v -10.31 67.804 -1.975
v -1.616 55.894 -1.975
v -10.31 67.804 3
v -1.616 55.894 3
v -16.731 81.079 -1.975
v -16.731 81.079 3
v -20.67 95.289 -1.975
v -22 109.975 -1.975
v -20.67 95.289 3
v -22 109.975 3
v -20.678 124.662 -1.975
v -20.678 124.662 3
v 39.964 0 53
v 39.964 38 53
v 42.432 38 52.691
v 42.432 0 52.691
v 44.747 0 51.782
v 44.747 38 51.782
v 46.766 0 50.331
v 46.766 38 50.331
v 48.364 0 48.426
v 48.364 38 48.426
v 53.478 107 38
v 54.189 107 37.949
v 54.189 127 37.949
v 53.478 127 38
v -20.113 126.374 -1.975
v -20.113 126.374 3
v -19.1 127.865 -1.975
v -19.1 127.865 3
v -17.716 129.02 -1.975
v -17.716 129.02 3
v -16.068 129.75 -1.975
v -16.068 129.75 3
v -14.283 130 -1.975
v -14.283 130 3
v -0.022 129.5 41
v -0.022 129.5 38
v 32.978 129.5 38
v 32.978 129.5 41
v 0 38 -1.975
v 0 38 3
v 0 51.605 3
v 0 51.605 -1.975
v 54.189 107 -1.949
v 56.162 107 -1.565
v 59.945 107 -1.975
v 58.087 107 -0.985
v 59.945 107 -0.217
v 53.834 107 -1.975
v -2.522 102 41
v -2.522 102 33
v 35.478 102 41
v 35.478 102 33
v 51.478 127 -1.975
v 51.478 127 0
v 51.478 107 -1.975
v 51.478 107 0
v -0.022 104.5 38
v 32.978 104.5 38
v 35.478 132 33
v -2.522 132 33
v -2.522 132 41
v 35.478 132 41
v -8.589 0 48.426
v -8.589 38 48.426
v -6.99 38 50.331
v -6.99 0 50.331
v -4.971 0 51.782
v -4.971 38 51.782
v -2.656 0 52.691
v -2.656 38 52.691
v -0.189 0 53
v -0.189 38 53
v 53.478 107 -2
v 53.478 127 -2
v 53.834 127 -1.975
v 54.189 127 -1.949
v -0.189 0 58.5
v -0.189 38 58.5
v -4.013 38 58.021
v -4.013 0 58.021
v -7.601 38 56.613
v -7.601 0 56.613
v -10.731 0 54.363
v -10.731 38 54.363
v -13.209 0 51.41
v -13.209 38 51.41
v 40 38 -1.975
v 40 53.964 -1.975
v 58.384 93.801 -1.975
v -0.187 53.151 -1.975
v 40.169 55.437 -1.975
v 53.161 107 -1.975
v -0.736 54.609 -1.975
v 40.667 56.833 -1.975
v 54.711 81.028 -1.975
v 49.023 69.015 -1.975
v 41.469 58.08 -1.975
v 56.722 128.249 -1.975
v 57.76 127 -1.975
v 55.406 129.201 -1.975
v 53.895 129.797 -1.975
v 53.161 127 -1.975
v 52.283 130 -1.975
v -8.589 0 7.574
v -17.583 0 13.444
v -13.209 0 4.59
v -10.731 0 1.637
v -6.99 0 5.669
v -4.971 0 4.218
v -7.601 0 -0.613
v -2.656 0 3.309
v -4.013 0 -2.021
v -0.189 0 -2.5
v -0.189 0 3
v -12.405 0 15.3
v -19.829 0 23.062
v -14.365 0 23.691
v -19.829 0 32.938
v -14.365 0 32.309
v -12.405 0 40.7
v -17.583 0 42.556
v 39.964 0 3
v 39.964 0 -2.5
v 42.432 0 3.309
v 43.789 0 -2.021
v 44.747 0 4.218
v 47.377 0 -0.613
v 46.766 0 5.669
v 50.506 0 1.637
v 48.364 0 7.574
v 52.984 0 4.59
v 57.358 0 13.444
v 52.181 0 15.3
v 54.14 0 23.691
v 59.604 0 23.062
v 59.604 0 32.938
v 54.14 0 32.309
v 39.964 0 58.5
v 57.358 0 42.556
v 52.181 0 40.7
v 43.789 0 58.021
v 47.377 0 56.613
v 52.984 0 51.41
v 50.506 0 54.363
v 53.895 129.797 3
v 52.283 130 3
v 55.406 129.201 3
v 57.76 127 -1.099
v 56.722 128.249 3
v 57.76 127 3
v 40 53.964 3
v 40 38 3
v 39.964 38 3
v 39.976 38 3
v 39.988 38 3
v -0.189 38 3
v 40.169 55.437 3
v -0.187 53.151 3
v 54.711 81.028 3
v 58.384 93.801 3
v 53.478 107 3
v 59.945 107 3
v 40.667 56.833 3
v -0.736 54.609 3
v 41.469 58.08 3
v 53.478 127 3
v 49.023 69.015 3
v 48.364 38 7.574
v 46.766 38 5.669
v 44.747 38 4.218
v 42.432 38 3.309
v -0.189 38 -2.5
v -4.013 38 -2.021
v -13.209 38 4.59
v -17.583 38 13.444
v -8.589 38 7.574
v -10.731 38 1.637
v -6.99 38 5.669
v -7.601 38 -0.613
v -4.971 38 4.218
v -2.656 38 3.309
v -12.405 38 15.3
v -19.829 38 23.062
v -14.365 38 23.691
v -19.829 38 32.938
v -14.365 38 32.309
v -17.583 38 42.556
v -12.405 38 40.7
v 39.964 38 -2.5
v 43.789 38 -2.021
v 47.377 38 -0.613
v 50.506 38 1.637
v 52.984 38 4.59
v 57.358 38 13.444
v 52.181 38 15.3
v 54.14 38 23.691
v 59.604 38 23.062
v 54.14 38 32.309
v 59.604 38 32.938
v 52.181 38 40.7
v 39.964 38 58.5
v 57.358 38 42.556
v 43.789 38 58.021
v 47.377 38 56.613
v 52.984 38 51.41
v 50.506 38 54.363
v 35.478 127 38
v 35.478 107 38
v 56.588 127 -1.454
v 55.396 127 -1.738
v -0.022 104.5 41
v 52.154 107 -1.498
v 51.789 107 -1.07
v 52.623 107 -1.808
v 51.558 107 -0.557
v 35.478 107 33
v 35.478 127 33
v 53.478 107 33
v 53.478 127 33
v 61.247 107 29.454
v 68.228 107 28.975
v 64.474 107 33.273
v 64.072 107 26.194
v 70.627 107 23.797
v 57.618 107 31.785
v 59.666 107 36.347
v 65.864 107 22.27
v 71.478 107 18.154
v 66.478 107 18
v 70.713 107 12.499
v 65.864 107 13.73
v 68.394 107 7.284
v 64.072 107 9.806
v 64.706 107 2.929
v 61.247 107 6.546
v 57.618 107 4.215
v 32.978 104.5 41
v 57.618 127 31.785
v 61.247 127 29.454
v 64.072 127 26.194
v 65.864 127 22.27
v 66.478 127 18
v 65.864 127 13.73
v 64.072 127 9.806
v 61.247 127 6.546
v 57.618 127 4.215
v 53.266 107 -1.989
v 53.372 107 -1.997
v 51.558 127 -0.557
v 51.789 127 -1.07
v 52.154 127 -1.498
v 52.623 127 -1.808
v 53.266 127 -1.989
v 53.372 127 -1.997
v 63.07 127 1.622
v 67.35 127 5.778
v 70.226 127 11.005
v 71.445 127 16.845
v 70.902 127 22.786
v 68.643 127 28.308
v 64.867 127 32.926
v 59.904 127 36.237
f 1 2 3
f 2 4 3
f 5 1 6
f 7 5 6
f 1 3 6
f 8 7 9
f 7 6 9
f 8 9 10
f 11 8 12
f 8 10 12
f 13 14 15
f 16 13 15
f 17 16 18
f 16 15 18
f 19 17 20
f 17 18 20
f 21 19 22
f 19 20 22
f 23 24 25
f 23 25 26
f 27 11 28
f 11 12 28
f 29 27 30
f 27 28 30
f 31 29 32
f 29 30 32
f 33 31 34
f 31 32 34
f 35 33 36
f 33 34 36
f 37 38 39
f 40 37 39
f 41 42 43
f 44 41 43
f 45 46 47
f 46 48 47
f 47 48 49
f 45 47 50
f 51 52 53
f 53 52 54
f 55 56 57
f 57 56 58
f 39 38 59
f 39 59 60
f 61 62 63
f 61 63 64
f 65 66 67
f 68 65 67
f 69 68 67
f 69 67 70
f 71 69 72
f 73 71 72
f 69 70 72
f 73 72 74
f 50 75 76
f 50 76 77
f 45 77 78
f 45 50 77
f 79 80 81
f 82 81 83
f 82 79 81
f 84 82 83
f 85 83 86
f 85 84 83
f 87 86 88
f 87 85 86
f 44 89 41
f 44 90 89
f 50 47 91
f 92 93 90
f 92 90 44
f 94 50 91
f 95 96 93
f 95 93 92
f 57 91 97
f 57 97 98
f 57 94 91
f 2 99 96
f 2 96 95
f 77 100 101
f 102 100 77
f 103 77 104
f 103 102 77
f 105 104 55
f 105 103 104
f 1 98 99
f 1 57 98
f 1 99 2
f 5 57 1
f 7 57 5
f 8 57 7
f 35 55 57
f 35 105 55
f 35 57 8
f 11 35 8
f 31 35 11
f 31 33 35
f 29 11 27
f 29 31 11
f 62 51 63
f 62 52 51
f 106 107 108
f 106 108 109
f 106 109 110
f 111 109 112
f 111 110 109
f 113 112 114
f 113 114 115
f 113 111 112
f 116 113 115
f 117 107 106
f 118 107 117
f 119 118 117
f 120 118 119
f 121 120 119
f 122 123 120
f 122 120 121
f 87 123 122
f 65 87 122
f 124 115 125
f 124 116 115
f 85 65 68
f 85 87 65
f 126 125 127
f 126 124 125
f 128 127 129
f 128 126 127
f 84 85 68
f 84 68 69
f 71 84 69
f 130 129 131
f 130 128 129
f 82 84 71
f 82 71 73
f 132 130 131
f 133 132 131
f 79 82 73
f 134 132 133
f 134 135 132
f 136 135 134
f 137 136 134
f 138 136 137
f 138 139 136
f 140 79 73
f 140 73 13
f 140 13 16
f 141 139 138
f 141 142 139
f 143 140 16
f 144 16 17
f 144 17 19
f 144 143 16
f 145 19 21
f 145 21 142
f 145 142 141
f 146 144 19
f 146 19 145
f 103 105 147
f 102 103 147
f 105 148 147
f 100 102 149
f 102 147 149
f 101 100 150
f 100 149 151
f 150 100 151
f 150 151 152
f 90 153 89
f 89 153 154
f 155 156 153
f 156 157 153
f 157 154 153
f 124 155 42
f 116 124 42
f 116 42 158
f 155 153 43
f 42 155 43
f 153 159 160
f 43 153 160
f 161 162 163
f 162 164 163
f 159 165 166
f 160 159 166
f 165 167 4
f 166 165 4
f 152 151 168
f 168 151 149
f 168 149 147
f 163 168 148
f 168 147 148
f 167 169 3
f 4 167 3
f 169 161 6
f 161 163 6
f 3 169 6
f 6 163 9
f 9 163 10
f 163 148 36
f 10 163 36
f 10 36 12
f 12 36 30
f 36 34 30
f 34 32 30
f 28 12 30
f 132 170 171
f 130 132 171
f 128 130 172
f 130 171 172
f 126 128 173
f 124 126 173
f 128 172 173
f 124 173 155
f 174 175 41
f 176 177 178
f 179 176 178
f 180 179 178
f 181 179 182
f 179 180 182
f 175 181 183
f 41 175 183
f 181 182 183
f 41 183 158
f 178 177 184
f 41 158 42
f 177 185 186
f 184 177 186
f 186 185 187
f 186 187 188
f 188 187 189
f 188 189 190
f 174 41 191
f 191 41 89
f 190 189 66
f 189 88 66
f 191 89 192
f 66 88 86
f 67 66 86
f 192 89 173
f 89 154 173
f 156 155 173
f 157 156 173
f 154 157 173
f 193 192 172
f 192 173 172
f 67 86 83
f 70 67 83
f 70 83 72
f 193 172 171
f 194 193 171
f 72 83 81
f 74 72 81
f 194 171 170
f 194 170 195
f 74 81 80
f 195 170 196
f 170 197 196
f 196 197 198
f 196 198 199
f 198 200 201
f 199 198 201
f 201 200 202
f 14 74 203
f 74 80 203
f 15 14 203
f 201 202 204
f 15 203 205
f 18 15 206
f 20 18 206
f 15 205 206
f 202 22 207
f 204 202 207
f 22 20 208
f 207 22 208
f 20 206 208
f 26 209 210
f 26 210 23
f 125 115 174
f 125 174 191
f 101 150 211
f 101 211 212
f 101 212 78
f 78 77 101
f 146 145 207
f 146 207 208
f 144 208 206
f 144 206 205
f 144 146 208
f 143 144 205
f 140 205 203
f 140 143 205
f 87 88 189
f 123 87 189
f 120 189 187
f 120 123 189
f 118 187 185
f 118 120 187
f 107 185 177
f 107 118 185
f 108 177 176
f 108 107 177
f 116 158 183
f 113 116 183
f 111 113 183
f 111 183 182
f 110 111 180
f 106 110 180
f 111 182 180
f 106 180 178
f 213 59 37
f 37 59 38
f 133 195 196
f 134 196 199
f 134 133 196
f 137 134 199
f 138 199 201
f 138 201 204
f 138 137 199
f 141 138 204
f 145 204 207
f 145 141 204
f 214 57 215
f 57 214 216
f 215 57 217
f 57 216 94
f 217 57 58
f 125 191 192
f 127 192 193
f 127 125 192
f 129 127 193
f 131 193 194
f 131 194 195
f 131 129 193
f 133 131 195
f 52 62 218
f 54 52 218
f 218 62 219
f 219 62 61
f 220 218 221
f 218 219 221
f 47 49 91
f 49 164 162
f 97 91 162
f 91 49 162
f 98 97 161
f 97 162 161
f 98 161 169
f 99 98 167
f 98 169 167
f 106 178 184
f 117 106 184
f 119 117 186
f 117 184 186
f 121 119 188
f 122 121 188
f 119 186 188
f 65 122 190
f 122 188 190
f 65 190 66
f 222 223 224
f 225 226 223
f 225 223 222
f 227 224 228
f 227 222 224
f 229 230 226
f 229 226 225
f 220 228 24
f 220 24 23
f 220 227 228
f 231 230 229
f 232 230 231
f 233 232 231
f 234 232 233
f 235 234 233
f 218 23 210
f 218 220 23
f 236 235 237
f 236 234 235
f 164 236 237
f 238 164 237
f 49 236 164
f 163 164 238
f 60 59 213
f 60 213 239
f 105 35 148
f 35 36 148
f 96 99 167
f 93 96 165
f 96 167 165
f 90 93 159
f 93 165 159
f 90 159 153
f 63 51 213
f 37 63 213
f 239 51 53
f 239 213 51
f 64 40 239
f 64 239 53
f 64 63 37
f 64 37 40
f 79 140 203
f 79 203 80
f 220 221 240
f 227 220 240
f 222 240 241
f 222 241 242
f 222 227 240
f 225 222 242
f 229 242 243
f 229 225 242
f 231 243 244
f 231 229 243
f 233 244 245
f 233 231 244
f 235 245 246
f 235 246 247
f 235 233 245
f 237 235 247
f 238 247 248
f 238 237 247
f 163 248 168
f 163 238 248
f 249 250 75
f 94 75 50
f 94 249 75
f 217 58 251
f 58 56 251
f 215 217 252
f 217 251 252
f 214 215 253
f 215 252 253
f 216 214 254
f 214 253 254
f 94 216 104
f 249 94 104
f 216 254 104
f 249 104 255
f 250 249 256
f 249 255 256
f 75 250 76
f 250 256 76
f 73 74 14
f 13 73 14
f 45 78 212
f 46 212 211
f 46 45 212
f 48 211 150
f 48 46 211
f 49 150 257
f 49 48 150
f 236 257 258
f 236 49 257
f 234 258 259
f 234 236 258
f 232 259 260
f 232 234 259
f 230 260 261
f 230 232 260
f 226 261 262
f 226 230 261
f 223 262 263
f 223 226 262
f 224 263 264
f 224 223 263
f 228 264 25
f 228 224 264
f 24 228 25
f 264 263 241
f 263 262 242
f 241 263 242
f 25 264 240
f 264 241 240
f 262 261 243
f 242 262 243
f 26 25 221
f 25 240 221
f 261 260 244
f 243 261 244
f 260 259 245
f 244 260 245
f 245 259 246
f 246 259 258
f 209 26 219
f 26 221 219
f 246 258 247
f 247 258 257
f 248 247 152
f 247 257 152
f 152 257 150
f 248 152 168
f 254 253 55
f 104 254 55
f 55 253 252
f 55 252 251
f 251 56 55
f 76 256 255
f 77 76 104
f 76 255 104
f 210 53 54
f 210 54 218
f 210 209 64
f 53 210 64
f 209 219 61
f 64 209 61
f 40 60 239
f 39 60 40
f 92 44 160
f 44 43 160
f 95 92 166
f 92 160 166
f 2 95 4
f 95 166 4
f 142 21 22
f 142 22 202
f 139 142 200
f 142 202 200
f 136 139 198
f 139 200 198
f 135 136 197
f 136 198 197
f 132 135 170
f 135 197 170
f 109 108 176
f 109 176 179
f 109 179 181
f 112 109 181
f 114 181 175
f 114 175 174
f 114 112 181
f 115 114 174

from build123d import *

# Parameters (mm, degrees)
CROQUIS1_W               = 2.2
CROQUIS1_H               = 25.999999999999993
CROQUIS1_W_2             = 2.200000000000003
CROQUIS1_H_2             = 26
SALIENTE_EXTRUIR2_DEPTH  = 3
SALIENTE_EXTRUIR3_DEPTH  = 20
CROQUIS3_R               = 7.999999999999991
CROQUIS3_R_2             = 8.000000000000002
CORTAR_EXTRUIR1_DEPTH    = 20
SALIENTE_EXTRUIR5_DEPTH  = 53.964297
CORTAR_EXTRUIR2_START    = -60
CROQUIS6_W               = 40.15324264759986
CROQUIS6_H               = 15.964297095512393
CORTAR_EXTRUIR2_DEPTH    = 60
CROQUIS7_W               = 5
CROQUIS7_H               = 20
SALIENTE_EXTRUIR7_DEPTH  = 33
SALIENTE_EXTRUIR8_START  = -5
CROQUIS9_W               = 30
CROQUIS9_H               = 30
SALIENTE_EXTRUIR8_DEPTH  = 5
SALIENTE_EXTRUIR9_START  = -20
SALIENTE_EXTRUIR9_DEPTH  = 20
SALIENTE_EXTRUIR10_START = -3
CROQUIS11_W              = 73.35697538547257
CROQUIS11_H              = 26
CROQUIS11_W_2            = 36
CROQUIS11_H_2            = 25.999999999999993
SALIENTE_EXTRUIR10_DEPTH = 3
CROQUIS12_R              = 15
CROQUIS12_R_2            = 12.499999999999995
SALIENTE_EXTRUIR13_DEPTH = 10
REDONDEO1_R              = 2
CORTAR_EXTRUIR4_DEPTH    = 134.84384260338862
SALIENTE_EXTRUIR15_DEPTH = 38
CROQUIS17_W              = 46
CROQUIS17_H              = 3
CORTAR_EXTRUIR5_DEPTH    = 20
CROQUIS18_W              = 58.34795028380313
CROQUIS18_H              = 55.73720719090147
CORTAR_EXTRUIR6_DEPTH    = 10
SALIENTE_EXTRUIR16_START = -5
SALIENTE_EXTRUIR16_DEPTH = 5
CROQUIS21_W              = 38.00000000000001
CROQUIS21_H              = 29.99999999999997
CROQUIS21_W_2            = 33.00000000000001
CROQUIS21_H_2            = 24.999999999999957
SALIENTE_EXTRUIR17_DEPTH = 3
SALIENTE_EXTRUIR18_DEPTH = 38
SALIENTE_EXTRUIR19_DEPTH = 1.974619


with BuildPart() as part:
    # Croquis1 → Saliente-Extruir2 (new body)
    with BuildSketch(Plane.XY):
        with BuildLine():
            ThreePointArc((1.78e-15, 6.500000000000045), (1.9038059222874422, 1.9038059222874395), (6.500000000000047, 0))
            Line((6.500000000000047, 0), (33.49999999999996, 0))
            ThreePointArc((33.49999999999996, 8.9e-16), (38.09619407771257, 1.9038059222874377), (40.00000000000001, 6.500000000000045))
            Line((40.00000000000001, 6.500000000000045), (39.99999999999999, 53.9642970955124))
            ThreePointArc((39.99999999999999, 53.9642970955124), (40.37823647136178, 56.149248193234044), (41.468926553672304, 58.07991369301713))
            ThreePointArc((41.468926553672304, 58.079913693017126), (57.39093897053555, 89.4797950941834), (58.67848769273629, 124.66225165562912))
            ThreePointArc((58.678487692736276, 124.66225165562913), (56.44829659298618, 128.49022222759615), (52.28324171709256, 130))
            Line((52.28324171709256, 130), (40.00000000000001, 130))
            Line((40.00000000000001, 130), (0, 130))
            Line((0, 130), (-14.283241717092526, 130))
            ThreePointArc((-14.283241717092526, 130), (-18.44829659298616, 128.49022222759615), (-20.678487692736265, 124.66225165562913))
            ThreePointArc((-20.67848769273626, 124.66225165562913), (-19.02022266397784, 88.0955618621395), (-1.615819209039536, 55.89370809971405))
            ThreePointArc((-1.6158192090395262, 55.89370809971404), (-0.41735357178952714, 53.89639076148384), (1.332e-14, 51.6047947173743))
            Line((1.324e-14, 51.6047947173743), (1.67e-15, 6.500000000000047))
        make_face()
        with Locations((3.1, 21.999999999999996)):
            Rectangle(CROQUIS1_W, CROQUIS1_H, mode=Mode.SUBTRACT)
        with Locations((36.9, 21.999999999999996)):
            Rectangle(CROQUIS1_W_2, CROQUIS1_H, mode=Mode.SUBTRACT)
        Polygon((-17.67848769273627, 127), (-15.478487692736273, 127), (-15.47848769273627, 101), (-17.678487692736265, 101), align=None, mode=Mode.SUBTRACT)
        with Locations((54.5784876927363, 114.00000000000001)):
            Rectangle(CROQUIS1_W_2, CROQUIS1_H_2, mode=Mode.SUBTRACT)
    extrude(amount=SALIENTE_EXTRUIR2_DEPTH)

    # Croquis2 → Saliente-Extruir3 (add)
    with BuildSketch(Plane(origin=(0, 0, 0), x_dir=(-1, 0, 0), z_dir=(0, 0, -1))):
        Polygon((4.481512307263694, 116.39887057980759), (4.481512307263693, 113.39887057980759), (-41.51848769273631, 113.39887057980758), (-41.51848769273631, 116.39887057980758), align=None)
    extrude(amount=SALIENTE_EXTRUIR3_DEPTH)

    # Croquis3 → Cortar-Extruir1 (cut)
    with BuildSketch(Plane(origin=(3.512e-14, 116.39887057980759, 0), x_dir=(1, -3e-16, 0), z_dir=(3e-16, 1, 0))):
        with Locations(Location((31.51848769273627, 9.999999999999998, 0), (0, 0, 180))):
            Circle(CROQUIS3_R)
        with Locations(Location((5.5184876927362705, 9.999999999999993, 0), (0, 0, 180))):
            Circle(CROQUIS3_R_2)
        Polygon((24.01848769273627, 20.000000000000004), (18.518487692736272, 20.000000000000004), (18.518487692736272, 15.000000000000005), (24.018487692736272, 15.000000000000004), align=None)
        Polygon((18.518487692736272, 15.000000000000005), (18.518487692736272, 20), (13.018487692736274, 20.000000000000004), (13.018487692736274, 15.000000000000005), align=None)
    extrude(amount=-CORTAR_EXTRUIR1_DEPTH, mode=Mode.SUBTRACT)

    # Croquis5 → Saliente-Extruir5 (add)
    with BuildSketch(Plane.XZ):
        with BuildLine():
            Line((39.96433456524687, 63.000000000000014), (-0.18890808235298706, 63.000000000000014))
            ThreePointArc((-0.18890808235298706, 63.000000000000014), (-7.362306106958867, 61.1735477674232), (-12.788788286604273, 56.138981437410735))
            ThreePointArc((-12.788788286604273, 56.138981437410735), (-19.612286758553036, 32.99999999999998), (-12.788788286604271, 9.861018562589255))
            ThreePointArc((-12.788788286604271, 9.861018562589255), (-7.362306106958855, 4.826452232576806), (-0.18890808235298392, 2.9999999999999956))
            Line((-0.18890808235298392, 2.9999999999999956), (39.96433456524688, 3))
            ThreePointArc((39.96433456524688, 3), (47.137732589852746, 4.826452232576804), (52.56421476949815, 9.861018562589242))
            ThreePointArc((52.56421476949815, 9.861018562589242), (59.38771324144694, 33.00000000000001), (52.56421476949814, 56.13898143741078))
            ThreePointArc((52.56421476949814, 56.13898143741078), (47.13773258985273, 61.17354776742321), (39.96433456524687, 63.000000000000014))
        make_face()
        with BuildLine():
            Line((39.96433456524688, 8), (-0.18890808235298012, 7.999999999999995))
            ThreePointArc((-0.18890808235298012, 7.999999999999995), (-4.971173432090228, 9.217634821717866), (-8.5888282185205, 12.5740123750595))
            ThreePointArc((-8.5888282185205, 12.5740123750595), (-14.612286758553036, 32.99999999999998), (-8.588828218520513, 53.4259876249405))
            ThreePointArc((-8.588828218520513, 53.4259876249405), (-4.971173432090235, 56.78236517828213), (-0.18890808235298706, 58))
            Line((-0.18890808235298706, 58), (39.96433456524687, 58.00000000000001))
            ThreePointArc((39.96433456524687, 58.00000000000001), (44.74659991498412, 56.78236517828215), (48.364254701414396, 53.425987624940525))
            ThreePointArc((48.364254701414396, 53.425987624940525), (54.387713241446946, 33.00000000000001), (48.364254701414396, 12.5740123750595))
            ThreePointArc((48.364254701414396, 12.5740123750595), (44.746599914984124, 9.21763482171787), (39.96433456524688, 8))
        make_face(mode=Mode.SUBTRACT)
    extrude(amount=-SALIENTE_EXTRUIR5_DEPTH)

    # Croquis6 → Cortar-Extruir2 (cut)
    with BuildSketch(Plane.XY.offset(63.000000000000014).offset(CORTAR_EXTRUIR2_START)):
        Polygon((-65.140227080974, 38), (-0.18890808235298706, 38), (-0.18890808235298706, 53.9642970955124), (39.96433456524687, 53.9642970955124), (39.96433456524687, 38), (86.01153637442849, 38), (86.01153637442849, 58.052685675367144), (-65.140227080974, 58.052685675367144), align=None)
        with Locations((19.887713241446942, 45.982148547756196)):
            Rectangle(CROQUIS6_W, CROQUIS6_H)
    extrude(amount=CORTAR_EXTRUIR2_DEPTH, mode=Mode.SUBTRACT)



with BuildPart() as body_2:
    # Croquis7 → Saliente-Extruir7 (new body)
    with BuildSketch(Plane(origin=(53.4784876927363, 0, 0), x_dir=(0, 0, -1), z_dir=(1, 0, 0))):
        with Locations((-35.5, 117.00000000000001)):
            Rectangle(CROQUIS7_W, CROQUIS7_H)
    extrude(amount=-SALIENTE_EXTRUIR7_DEPTH)

    # Croquis9 → Saliente-Extruir8 (add)
    with BuildSketch(Plane.XY.offset(38).offset(SALIENTE_EXTRUIR8_START)):
        with Locations((20.478487692736316, 117.00000000000003)):
            Rectangle(CROQUIS9_W, CROQUIS9_H)
    extrude(amount=SALIENTE_EXTRUIR8_DEPTH)


with BuildPart() as part_1:
    add(part.part)

    add(body_2.part)  # Saliente-Extruir9 merges body 2
    # Croquis10 → Saliente-Extruir9 (add)
    with BuildSketch(Plane(origin=(0, 127, 0), x_dir=(1, 0, 0), z_dir=(0, 1, 0)).offset(SALIENTE_EXTRUIR9_START)):
        with BuildLine():
            Line((54.189147591213455, -37.94923857868021), (53.4784876927363, -38))
            Line((53.4784876927363, -38), (53.4784876927363, -33))
            ThreePointArc((53.4784876927363, -33), (66.4784876927363, -18.000000000000004), (53.4784876927363, -2.9999999999999996))
            Line((53.4784876927363, -2.9999999999999996), (53.4784876927363, 0))
            Line((53.4784876927363, 0), (51.4784876927363, -4.3e-16))
            Line((51.4784876927363, -4.3e-16), (51.4784876927363, 1.9999999999999996))
            Line((51.4784876927363, 1.9999999999999996), (53.4784876927363, 2))
            Line((53.4784876927363, 2), (54.18914759121346, 1.9492385786802033))
            ThreePointArc((54.18914759121346, 1.9492385786802033), (71.47848769273631, -18.000000000000007), (54.189147591213455, -37.94923857868021))
        make_face()
    extrude(amount=SALIENTE_EXTRUIR9_DEPTH)

    # Croquis11 → Saliente-Extruir10 (add)
    with BuildSketch(Plane(origin=(0, 0, 0), x_dir=(-1, 0, 0), z_dir=(0, 0, -1)).offset(SALIENTE_EXTRUIR10_START)):
        with Locations((-19.000000000000018, 114.00000000000001)):
            Rectangle(CROQUIS11_W, CROQUIS11_H)
        with Locations((-20, 21.999999999999996)):
            Rectangle(CROQUIS11_W_2, CROQUIS11_H_2)
    extrude(amount=SALIENTE_EXTRUIR10_DEPTH)

    # Croquis12 → Saliente-Extruir13 (add)
    with BuildSketch(Plane.XY.offset(38)):
        with Locations(Location((20.478487692736316, 117.00000000000003, 0), (0, 0, 180))):
            Circle(CROQUIS12_R)
        with Locations((20.478487692736316, 117.00000000000003)):
            Circle(CROQUIS12_R_2, mode=Mode.SUBTRACT)
    extrude(amount=SALIENTE_EXTRUIR13_DEPTH)

    # Redondeo1
    redondeo1_edges = [part_1.edges().sort_by_distance(p)[0] for p in [
        (51.4784876927363, 117, -1.9999999999999996),
    ]]
    fillet(redondeo1_edges, radius=REDONDEO1_R - 0.0001)  # a hair under: the kernel refuses the full size

    # Croquis14 → Cortar-Extruir4 (cut, through all)
    with BuildSketch(Plane(origin=(0, 38, 0), x_dir=(1, 0, 0), z_dir=(0, 1, 0))):
        with BuildLine():
            ThreePointArc((48.36425493229366, -7.57401013919257), (44.74660042130513, -4.217634185252958), (39.96433624040055, -2.9999999999999822))
            Line((39.96433624040055, -2.999999999999983), (7.11e-15, -2.999999999999993))
            Line((7.11e-15, -2.999999999999993), (-0.18890808235298095, -2.999999999999993))
            ThreePointArc((-0.1889080823529836, -2.999999999999993), (-4.9711734320902385, -4.217634821717869), (-8.58882821852051, -7.5740123750595165))
            ThreePointArc((-8.588828218520508, -7.574012375059517), (-14.612286758553015, -27.99999999999999), (-8.588828218520522, -48.42598762494047))
            ThreePointArc((-8.588828218520526, -48.425987624940475), (-4.971173432090255, -51.78236517828213), (-0.18890808235300008, -53.00000000000001))
            Line((-0.18890808235300227, -53.00000000000001), (39.964336240400556, -53.00000000000002))
            ThreePointArc((39.964336240400556, -53.00000000000002), (44.74660042130514, -51.78236581474704), (48.36425493229367, -48.42598986080743))
            ThreePointArc((48.36425493229366, -48.42598986080742), (54.38771708653283, -27.999999999999993), (48.36425493229366, -7.574010139192573))
        make_face()
        with BuildLine():
            ThreePointArc((52.56421476949813, -56.13898143741079), (59.326001019675516, -35.29338058691803), (54.84218308379573, -13.842128762629663))
            ThreePointArc((54.84218308379583, -13.842128762629622), (57.147087828663246, -32.41618815306372), (50.88423053986159, -50.05378681904967))
            ThreePointArc((50.88423053986159, -50.05378681904967), (46.181279675576505, -54.41707555917115), (39.964336240400556, -56.00000000000002))
            Line((39.964336240400556, -56.00000000000002), (-0.18890808235300227, -56.00000000000002))
            ThreePointArc((-0.18890808235300094, -56.00000000000002), (-6.40585303701144, -54.417074731766775), (-11.108804259370787, -50.05378391242262))
            ThreePointArc((-11.108804259370793, -50.05378391242262), (-17.37165915295804, -32.41617365692677), (-15.066744784377477, -13.84210526315766))
            ThreePointArc((-15.066744784377445, -13.84210526315767), (-19.550575244054688, -35.29336745437739), (-12.788788286604277, -56.138981437410735))
            ThreePointArc((-12.788788286604277, -56.138981437410735), (-7.362306106958864, -61.17354776742319), (-0.18890808235299072, -63))
            Line((-0.18890808235298845, -63), (39.96433456524687, -63.000000000000014))
            ThreePointArc((39.96433456524687, -63.000000000000014), (47.137732589852725, -61.173547767423216), (52.56421476949813, -56.13898143741079))
        make_face()
    extrude(amount=-CORTAR_EXTRUIR4_DEPTH, mode=Mode.SUBTRACT)


with BuildPart() as cortar_extruir4_piece_1:
    # of the separate pieces the step leaves, piece 1, a body of its own (cortar_extruir4_pieces)
    add(part_1.part.solids().sort_by_distance((51.478487693, 127, -0.0001))[0])



with BuildPart() as cortar_extruir4_piece_2:
    # of the separate pieces the step leaves, piece 2, a body of its own (cortar_extruir4_pieces)
    add(part_1.part.solids().sort_by_distance((39.964334565, 0, 3))[0])


with BuildPart() as cortar_extruir4_piece_3:
    # of the separate pieces the step leaves, piece 3, a body of its own (cortar_extruir4_pieces)
    add(part_1.part.solids().sort_by_distance((-0.188908082, 38, 3))[0])


with BuildPart() as cortar_extruir4_piece_1_1:
    add(cortar_extruir4_piece_1.part)

    add(cortar_extruir4_piece_2.part)  # Saliente-Extruir15 merges Cortar-Extruir4 piece 2

    add(cortar_extruir4_piece_3.part)  # Saliente-Extruir15 merges Cortar-Extruir4 piece 3
    # Croquis16 → Saliente-Extruir15 (add)
    with BuildSketch(Plane(origin=(0, 38, 0), x_dir=(1, 0, 0), z_dir=(0, 1, 0))):
        with BuildLine():
            Line((39.96433624040056, 6.07e-15), (-0.18890808235298012, 6.07e-15))
            ThreePointArc((-0.18890808235298012, 6.07e-15), (-6.405853037011415, -1.5829252682332342), (-11.108804259370778, -5.946216087577372))
            ThreePointArc((-11.108804259370778, -5.946216087577372), (-17.61228675855303, -27.999999999999996), (-11.108804259370793, -50.05378391242263))
            ThreePointArc((-11.108804259370793, -50.05378391242263), (-6.405853037011435, -54.417074731766775), (-0.1889080823529964, -56.000000000000014))
            Line((-0.1889080823529964, -56.000000000000014), (39.96433624040056, -56.00000000000002))
            ThreePointArc((39.96433624040056, -56.00000000000002), (46.18127967557652, -54.417075559171145), (50.884230539861605, -50.053786819049655))
            ThreePointArc((50.884230539861605, -50.053786819049655), (57.387717086532845, -28.00000000000002), (50.88423053986163, -5.946213180950382))
            ThreePointArc((50.88423053986163, -5.946213180950382), (46.18127967557653, -1.5829244408288794), (39.96433624040056, 6.07e-15))
        make_face()
        with BuildLine():
            Line((39.96433624040056, -2.999999999999994), (-0.18890808235298012, -2.999999999999994))
            ThreePointArc((-0.18890808235298012, -2.999999999999994), (-4.971173432090238, -4.217634821717871), (-8.588828218520524, -7.574012375059513))
            ThreePointArc((-8.588828218520524, -7.574012375059513), (-14.61228675855303, -27.999999999999996), (-8.588828218520524, -48.42598762494049))
            ThreePointArc((-8.588828218520524, -48.42598762494049), (-4.97117343209025, -51.782365178282134), (-0.188908082352994, -53.00000000000002))
            Line((-0.188908082352994, -53.00000000000002), (39.96433624040056, -53.00000000000002))
            ThreePointArc((39.96433624040056, -53.00000000000002), (44.746600421305146, -51.78236581474704), (48.364254932293676, -48.42598986080743))
            ThreePointArc((48.364254932293676, -48.42598986080743), (54.387717086532845, -28.000000000000004), (48.364254932293676, -7.574010139192587))
            ThreePointArc((48.364254932293676, -7.574010139192587), (44.746600421305146, -4.217634185252978), (39.96433624040056, -2.999999999999994))
        make_face(mode=Mode.SUBTRACT)
    extrude(amount=-SALIENTE_EXTRUIR15_DEPTH)

    # Croquis17 → Cortar-Extruir5 (cut)
    with BuildSketch(Plane(origin=(0, 0, -20), x_dir=(-1, 0, 0), z_dir=(0, 0, -1))):
        with Locations((-18.518487692736308, 114.89887057980759)):
            Rectangle(CROQUIS17_W, CROQUIS17_H)
    extrude(amount=-CORTAR_EXTRUIR5_DEPTH, mode=Mode.SUBTRACT)

    # Croquis18 → Cortar-Extruir6 (cut)
    with BuildSketch(Plane.XY.offset(48)):
        with Locations((19.45719587983774, 118.79603010754636)):
            Rectangle(CROQUIS18_W, CROQUIS18_H)
    extrude(amount=-CORTAR_EXTRUIR6_DEPTH, mode=Mode.SUBTRACT)

    # Croquis20 → Saliente-Extruir16 (add)
    with BuildSketch(Plane.XY.offset(38).offset(SALIENTE_EXTRUIR16_START)):
        Polygon((5.478487692736317, 104.49999999999999), (5.478487692736317, 129.5), (-0.02151230726369135, 129.5), (-0.02151230726368802, 104.49999999999999), align=None)
        Polygon((-0.02151230726369135, 129.5), (5.478487692736316, 129.5), (5.478487692736317, 132.00000000000003), (-2.5215123072636914, 132), (-2.5215123072636847, 101.99999999999999), (5.478487692736316, 101.99999999999999), (5.478487692736317, 104.49999999999999), (-0.02151230726369135, 104.49999999999999), align=None)
    extrude(amount=SALIENTE_EXTRUIR16_DEPTH)

    # Croquis21 → Saliente-Extruir17 (add)
    with BuildSketch(Plane.XY.offset(38)):
        with Locations((16.478487692736312, 117.00000000000001)):
            Rectangle(CROQUIS21_W, CROQUIS21_H)
        with Locations((16.478487692736312, 117.00000000000003)):
            Rectangle(CROQUIS21_W_2, CROQUIS21_H_2, mode=Mode.SUBTRACT)
    extrude(amount=SALIENTE_EXTRUIR17_DEPTH)

    # Croquis22 → Saliente-Extruir18 (add)
    with BuildSketch(Plane.XZ):
        with BuildLine():
            Line((-0.18890808235298298, -2.5000000000000075), (39.96433624040056, -2.500000000000006))
            ThreePointArc((39.96433624040056, -2.500000000000006), (47.376845720802685, -0.6126670128578695), (52.98421021283491, 4.589715715748548))
            ThreePointArc((52.98421021283491, 4.589715715748548), (59.88771708653283, 28.000000000000032), (52.98421021283489, 51.41028428425151))
            ThreePointArc((52.98421021283489, 51.41028428425151), (47.37684572080267, 56.612667012857905), (39.96433624040056, 58.50000000000002))
            Line((39.96433624040056, 58.50000000000002), (-0.18890808235299306, 58.50000000000001))
            ThreePointArc((-0.18890808235299306, 58.50000000000001), (-7.601419374445746, 56.612666026337294), (-13.20878429341268, 51.41028081865773))
            ThreePointArc((-13.20878429341268, 51.41028081865773), (-20.11228675855303, 27.999999999999986), (-13.208784293412673, 4.589719181342242))
            ThreePointArc((-13.208784293412673, 4.589719181342242), (-7.601419374445738, -0.6126660263373136), (-0.18890808235298298, -2.5000000000000075))
        make_face()
        with BuildLine():
            Line((-0.1889080823529825, -6.94e-15), (39.96433624040056, -6.07e-15))
            ThreePointArc((39.96433624040056, -6.07e-15), (46.18127967557653, 1.582924440828883), (50.88423053986163, 5.946213180950394))
            ThreePointArc((50.88423053986163, 5.946213180950394), (57.387717086532845, 28.000000000000032), (50.884230539861605, 50.05378681904966))
            ThreePointArc((50.884230539861605, 50.05378681904966), (46.18127967557652, 54.41707555917115), (39.96433624040056, 56.00000000000002))
            Line((39.96433624040056, 56.00000000000002), (-0.18890808235299322, 56.000000000000014))
            ThreePointArc((-0.18890808235299322, 56.000000000000014), (-6.405853037011434, 54.417074731766775), (-11.108804259370794, 50.053783912422624))
            ThreePointArc((-11.108804259370794, 50.053783912422624), (-17.612286758553036, 27.999999999999986), (-11.108804259370785, 5.946216087577363))
            ThreePointArc((-11.108804259370785, 5.946216087577363), (-6.405853037011422, 1.5829252682332218), (-0.1889080823529825, -6.94e-15))
        make_face(mode=Mode.SUBTRACT)
    extrude(amount=-SALIENTE_EXTRUIR18_DEPTH)

    # Croquis23 → Saliente-Extruir19 (add)
    with BuildSketch(Plane(origin=(0, 0, 0), x_dir=(-1, 0, 0), z_dir=(0, 0, -1))):
        with BuildLine():
            Line((-39.99999999999999, 38), (-6.94e-15, 38))
            Line((-6.94e-15, 38), (-1.324e-14, 51.6047947173743))
            ThreePointArc((-1.324e-14, 51.6047947173743), (0.4173535717895369, 53.89639076148386), (1.615819209039554, 55.893708099714054))
            ThreePointArc((1.615819209039554, 55.893708099714054), (19.020222663977847, 88.09556186213952), (20.67848769273625, 124.66225165562916))
            ThreePointArc((20.67848769273625, 124.66225165562916), (18.448296592986146, 128.49022222759615), (14.283241717092526, 130))
            Line((14.283241717092526, 130), (-52.28324171709256, 130))
            ThreePointArc((-52.28324171709256, 130), (-55.40574071629176, 129.20087712549568), (-57.76046729214422, 127))
            Line((-57.76046729214422, 127), (-51.4784876927363, 127))
            Line((-51.4784876927363, 127), (-51.4784876927363, 107))
            Line((-51.4784876927363, 107), (-59.945103575503516, 107))
            ThreePointArc((-59.945103575503516, 107), (-54.711170964031545, 81.02766406850974), (-41.46892655367233, 58.07991369301716))
            ThreePointArc((-41.46892655367233, 58.07991369301716), (-40.37823647136178, 56.149248193234065), (-39.999999999999986, 53.9642970955124))
            Line((-39.999999999999986, 53.9642970955124), (-39.99999999999999, 38))
        make_face()
    extrude(amount=SALIENTE_EXTRUIR19_DEPTH)


solid = cortar_extruir4_piece_1_1.part
